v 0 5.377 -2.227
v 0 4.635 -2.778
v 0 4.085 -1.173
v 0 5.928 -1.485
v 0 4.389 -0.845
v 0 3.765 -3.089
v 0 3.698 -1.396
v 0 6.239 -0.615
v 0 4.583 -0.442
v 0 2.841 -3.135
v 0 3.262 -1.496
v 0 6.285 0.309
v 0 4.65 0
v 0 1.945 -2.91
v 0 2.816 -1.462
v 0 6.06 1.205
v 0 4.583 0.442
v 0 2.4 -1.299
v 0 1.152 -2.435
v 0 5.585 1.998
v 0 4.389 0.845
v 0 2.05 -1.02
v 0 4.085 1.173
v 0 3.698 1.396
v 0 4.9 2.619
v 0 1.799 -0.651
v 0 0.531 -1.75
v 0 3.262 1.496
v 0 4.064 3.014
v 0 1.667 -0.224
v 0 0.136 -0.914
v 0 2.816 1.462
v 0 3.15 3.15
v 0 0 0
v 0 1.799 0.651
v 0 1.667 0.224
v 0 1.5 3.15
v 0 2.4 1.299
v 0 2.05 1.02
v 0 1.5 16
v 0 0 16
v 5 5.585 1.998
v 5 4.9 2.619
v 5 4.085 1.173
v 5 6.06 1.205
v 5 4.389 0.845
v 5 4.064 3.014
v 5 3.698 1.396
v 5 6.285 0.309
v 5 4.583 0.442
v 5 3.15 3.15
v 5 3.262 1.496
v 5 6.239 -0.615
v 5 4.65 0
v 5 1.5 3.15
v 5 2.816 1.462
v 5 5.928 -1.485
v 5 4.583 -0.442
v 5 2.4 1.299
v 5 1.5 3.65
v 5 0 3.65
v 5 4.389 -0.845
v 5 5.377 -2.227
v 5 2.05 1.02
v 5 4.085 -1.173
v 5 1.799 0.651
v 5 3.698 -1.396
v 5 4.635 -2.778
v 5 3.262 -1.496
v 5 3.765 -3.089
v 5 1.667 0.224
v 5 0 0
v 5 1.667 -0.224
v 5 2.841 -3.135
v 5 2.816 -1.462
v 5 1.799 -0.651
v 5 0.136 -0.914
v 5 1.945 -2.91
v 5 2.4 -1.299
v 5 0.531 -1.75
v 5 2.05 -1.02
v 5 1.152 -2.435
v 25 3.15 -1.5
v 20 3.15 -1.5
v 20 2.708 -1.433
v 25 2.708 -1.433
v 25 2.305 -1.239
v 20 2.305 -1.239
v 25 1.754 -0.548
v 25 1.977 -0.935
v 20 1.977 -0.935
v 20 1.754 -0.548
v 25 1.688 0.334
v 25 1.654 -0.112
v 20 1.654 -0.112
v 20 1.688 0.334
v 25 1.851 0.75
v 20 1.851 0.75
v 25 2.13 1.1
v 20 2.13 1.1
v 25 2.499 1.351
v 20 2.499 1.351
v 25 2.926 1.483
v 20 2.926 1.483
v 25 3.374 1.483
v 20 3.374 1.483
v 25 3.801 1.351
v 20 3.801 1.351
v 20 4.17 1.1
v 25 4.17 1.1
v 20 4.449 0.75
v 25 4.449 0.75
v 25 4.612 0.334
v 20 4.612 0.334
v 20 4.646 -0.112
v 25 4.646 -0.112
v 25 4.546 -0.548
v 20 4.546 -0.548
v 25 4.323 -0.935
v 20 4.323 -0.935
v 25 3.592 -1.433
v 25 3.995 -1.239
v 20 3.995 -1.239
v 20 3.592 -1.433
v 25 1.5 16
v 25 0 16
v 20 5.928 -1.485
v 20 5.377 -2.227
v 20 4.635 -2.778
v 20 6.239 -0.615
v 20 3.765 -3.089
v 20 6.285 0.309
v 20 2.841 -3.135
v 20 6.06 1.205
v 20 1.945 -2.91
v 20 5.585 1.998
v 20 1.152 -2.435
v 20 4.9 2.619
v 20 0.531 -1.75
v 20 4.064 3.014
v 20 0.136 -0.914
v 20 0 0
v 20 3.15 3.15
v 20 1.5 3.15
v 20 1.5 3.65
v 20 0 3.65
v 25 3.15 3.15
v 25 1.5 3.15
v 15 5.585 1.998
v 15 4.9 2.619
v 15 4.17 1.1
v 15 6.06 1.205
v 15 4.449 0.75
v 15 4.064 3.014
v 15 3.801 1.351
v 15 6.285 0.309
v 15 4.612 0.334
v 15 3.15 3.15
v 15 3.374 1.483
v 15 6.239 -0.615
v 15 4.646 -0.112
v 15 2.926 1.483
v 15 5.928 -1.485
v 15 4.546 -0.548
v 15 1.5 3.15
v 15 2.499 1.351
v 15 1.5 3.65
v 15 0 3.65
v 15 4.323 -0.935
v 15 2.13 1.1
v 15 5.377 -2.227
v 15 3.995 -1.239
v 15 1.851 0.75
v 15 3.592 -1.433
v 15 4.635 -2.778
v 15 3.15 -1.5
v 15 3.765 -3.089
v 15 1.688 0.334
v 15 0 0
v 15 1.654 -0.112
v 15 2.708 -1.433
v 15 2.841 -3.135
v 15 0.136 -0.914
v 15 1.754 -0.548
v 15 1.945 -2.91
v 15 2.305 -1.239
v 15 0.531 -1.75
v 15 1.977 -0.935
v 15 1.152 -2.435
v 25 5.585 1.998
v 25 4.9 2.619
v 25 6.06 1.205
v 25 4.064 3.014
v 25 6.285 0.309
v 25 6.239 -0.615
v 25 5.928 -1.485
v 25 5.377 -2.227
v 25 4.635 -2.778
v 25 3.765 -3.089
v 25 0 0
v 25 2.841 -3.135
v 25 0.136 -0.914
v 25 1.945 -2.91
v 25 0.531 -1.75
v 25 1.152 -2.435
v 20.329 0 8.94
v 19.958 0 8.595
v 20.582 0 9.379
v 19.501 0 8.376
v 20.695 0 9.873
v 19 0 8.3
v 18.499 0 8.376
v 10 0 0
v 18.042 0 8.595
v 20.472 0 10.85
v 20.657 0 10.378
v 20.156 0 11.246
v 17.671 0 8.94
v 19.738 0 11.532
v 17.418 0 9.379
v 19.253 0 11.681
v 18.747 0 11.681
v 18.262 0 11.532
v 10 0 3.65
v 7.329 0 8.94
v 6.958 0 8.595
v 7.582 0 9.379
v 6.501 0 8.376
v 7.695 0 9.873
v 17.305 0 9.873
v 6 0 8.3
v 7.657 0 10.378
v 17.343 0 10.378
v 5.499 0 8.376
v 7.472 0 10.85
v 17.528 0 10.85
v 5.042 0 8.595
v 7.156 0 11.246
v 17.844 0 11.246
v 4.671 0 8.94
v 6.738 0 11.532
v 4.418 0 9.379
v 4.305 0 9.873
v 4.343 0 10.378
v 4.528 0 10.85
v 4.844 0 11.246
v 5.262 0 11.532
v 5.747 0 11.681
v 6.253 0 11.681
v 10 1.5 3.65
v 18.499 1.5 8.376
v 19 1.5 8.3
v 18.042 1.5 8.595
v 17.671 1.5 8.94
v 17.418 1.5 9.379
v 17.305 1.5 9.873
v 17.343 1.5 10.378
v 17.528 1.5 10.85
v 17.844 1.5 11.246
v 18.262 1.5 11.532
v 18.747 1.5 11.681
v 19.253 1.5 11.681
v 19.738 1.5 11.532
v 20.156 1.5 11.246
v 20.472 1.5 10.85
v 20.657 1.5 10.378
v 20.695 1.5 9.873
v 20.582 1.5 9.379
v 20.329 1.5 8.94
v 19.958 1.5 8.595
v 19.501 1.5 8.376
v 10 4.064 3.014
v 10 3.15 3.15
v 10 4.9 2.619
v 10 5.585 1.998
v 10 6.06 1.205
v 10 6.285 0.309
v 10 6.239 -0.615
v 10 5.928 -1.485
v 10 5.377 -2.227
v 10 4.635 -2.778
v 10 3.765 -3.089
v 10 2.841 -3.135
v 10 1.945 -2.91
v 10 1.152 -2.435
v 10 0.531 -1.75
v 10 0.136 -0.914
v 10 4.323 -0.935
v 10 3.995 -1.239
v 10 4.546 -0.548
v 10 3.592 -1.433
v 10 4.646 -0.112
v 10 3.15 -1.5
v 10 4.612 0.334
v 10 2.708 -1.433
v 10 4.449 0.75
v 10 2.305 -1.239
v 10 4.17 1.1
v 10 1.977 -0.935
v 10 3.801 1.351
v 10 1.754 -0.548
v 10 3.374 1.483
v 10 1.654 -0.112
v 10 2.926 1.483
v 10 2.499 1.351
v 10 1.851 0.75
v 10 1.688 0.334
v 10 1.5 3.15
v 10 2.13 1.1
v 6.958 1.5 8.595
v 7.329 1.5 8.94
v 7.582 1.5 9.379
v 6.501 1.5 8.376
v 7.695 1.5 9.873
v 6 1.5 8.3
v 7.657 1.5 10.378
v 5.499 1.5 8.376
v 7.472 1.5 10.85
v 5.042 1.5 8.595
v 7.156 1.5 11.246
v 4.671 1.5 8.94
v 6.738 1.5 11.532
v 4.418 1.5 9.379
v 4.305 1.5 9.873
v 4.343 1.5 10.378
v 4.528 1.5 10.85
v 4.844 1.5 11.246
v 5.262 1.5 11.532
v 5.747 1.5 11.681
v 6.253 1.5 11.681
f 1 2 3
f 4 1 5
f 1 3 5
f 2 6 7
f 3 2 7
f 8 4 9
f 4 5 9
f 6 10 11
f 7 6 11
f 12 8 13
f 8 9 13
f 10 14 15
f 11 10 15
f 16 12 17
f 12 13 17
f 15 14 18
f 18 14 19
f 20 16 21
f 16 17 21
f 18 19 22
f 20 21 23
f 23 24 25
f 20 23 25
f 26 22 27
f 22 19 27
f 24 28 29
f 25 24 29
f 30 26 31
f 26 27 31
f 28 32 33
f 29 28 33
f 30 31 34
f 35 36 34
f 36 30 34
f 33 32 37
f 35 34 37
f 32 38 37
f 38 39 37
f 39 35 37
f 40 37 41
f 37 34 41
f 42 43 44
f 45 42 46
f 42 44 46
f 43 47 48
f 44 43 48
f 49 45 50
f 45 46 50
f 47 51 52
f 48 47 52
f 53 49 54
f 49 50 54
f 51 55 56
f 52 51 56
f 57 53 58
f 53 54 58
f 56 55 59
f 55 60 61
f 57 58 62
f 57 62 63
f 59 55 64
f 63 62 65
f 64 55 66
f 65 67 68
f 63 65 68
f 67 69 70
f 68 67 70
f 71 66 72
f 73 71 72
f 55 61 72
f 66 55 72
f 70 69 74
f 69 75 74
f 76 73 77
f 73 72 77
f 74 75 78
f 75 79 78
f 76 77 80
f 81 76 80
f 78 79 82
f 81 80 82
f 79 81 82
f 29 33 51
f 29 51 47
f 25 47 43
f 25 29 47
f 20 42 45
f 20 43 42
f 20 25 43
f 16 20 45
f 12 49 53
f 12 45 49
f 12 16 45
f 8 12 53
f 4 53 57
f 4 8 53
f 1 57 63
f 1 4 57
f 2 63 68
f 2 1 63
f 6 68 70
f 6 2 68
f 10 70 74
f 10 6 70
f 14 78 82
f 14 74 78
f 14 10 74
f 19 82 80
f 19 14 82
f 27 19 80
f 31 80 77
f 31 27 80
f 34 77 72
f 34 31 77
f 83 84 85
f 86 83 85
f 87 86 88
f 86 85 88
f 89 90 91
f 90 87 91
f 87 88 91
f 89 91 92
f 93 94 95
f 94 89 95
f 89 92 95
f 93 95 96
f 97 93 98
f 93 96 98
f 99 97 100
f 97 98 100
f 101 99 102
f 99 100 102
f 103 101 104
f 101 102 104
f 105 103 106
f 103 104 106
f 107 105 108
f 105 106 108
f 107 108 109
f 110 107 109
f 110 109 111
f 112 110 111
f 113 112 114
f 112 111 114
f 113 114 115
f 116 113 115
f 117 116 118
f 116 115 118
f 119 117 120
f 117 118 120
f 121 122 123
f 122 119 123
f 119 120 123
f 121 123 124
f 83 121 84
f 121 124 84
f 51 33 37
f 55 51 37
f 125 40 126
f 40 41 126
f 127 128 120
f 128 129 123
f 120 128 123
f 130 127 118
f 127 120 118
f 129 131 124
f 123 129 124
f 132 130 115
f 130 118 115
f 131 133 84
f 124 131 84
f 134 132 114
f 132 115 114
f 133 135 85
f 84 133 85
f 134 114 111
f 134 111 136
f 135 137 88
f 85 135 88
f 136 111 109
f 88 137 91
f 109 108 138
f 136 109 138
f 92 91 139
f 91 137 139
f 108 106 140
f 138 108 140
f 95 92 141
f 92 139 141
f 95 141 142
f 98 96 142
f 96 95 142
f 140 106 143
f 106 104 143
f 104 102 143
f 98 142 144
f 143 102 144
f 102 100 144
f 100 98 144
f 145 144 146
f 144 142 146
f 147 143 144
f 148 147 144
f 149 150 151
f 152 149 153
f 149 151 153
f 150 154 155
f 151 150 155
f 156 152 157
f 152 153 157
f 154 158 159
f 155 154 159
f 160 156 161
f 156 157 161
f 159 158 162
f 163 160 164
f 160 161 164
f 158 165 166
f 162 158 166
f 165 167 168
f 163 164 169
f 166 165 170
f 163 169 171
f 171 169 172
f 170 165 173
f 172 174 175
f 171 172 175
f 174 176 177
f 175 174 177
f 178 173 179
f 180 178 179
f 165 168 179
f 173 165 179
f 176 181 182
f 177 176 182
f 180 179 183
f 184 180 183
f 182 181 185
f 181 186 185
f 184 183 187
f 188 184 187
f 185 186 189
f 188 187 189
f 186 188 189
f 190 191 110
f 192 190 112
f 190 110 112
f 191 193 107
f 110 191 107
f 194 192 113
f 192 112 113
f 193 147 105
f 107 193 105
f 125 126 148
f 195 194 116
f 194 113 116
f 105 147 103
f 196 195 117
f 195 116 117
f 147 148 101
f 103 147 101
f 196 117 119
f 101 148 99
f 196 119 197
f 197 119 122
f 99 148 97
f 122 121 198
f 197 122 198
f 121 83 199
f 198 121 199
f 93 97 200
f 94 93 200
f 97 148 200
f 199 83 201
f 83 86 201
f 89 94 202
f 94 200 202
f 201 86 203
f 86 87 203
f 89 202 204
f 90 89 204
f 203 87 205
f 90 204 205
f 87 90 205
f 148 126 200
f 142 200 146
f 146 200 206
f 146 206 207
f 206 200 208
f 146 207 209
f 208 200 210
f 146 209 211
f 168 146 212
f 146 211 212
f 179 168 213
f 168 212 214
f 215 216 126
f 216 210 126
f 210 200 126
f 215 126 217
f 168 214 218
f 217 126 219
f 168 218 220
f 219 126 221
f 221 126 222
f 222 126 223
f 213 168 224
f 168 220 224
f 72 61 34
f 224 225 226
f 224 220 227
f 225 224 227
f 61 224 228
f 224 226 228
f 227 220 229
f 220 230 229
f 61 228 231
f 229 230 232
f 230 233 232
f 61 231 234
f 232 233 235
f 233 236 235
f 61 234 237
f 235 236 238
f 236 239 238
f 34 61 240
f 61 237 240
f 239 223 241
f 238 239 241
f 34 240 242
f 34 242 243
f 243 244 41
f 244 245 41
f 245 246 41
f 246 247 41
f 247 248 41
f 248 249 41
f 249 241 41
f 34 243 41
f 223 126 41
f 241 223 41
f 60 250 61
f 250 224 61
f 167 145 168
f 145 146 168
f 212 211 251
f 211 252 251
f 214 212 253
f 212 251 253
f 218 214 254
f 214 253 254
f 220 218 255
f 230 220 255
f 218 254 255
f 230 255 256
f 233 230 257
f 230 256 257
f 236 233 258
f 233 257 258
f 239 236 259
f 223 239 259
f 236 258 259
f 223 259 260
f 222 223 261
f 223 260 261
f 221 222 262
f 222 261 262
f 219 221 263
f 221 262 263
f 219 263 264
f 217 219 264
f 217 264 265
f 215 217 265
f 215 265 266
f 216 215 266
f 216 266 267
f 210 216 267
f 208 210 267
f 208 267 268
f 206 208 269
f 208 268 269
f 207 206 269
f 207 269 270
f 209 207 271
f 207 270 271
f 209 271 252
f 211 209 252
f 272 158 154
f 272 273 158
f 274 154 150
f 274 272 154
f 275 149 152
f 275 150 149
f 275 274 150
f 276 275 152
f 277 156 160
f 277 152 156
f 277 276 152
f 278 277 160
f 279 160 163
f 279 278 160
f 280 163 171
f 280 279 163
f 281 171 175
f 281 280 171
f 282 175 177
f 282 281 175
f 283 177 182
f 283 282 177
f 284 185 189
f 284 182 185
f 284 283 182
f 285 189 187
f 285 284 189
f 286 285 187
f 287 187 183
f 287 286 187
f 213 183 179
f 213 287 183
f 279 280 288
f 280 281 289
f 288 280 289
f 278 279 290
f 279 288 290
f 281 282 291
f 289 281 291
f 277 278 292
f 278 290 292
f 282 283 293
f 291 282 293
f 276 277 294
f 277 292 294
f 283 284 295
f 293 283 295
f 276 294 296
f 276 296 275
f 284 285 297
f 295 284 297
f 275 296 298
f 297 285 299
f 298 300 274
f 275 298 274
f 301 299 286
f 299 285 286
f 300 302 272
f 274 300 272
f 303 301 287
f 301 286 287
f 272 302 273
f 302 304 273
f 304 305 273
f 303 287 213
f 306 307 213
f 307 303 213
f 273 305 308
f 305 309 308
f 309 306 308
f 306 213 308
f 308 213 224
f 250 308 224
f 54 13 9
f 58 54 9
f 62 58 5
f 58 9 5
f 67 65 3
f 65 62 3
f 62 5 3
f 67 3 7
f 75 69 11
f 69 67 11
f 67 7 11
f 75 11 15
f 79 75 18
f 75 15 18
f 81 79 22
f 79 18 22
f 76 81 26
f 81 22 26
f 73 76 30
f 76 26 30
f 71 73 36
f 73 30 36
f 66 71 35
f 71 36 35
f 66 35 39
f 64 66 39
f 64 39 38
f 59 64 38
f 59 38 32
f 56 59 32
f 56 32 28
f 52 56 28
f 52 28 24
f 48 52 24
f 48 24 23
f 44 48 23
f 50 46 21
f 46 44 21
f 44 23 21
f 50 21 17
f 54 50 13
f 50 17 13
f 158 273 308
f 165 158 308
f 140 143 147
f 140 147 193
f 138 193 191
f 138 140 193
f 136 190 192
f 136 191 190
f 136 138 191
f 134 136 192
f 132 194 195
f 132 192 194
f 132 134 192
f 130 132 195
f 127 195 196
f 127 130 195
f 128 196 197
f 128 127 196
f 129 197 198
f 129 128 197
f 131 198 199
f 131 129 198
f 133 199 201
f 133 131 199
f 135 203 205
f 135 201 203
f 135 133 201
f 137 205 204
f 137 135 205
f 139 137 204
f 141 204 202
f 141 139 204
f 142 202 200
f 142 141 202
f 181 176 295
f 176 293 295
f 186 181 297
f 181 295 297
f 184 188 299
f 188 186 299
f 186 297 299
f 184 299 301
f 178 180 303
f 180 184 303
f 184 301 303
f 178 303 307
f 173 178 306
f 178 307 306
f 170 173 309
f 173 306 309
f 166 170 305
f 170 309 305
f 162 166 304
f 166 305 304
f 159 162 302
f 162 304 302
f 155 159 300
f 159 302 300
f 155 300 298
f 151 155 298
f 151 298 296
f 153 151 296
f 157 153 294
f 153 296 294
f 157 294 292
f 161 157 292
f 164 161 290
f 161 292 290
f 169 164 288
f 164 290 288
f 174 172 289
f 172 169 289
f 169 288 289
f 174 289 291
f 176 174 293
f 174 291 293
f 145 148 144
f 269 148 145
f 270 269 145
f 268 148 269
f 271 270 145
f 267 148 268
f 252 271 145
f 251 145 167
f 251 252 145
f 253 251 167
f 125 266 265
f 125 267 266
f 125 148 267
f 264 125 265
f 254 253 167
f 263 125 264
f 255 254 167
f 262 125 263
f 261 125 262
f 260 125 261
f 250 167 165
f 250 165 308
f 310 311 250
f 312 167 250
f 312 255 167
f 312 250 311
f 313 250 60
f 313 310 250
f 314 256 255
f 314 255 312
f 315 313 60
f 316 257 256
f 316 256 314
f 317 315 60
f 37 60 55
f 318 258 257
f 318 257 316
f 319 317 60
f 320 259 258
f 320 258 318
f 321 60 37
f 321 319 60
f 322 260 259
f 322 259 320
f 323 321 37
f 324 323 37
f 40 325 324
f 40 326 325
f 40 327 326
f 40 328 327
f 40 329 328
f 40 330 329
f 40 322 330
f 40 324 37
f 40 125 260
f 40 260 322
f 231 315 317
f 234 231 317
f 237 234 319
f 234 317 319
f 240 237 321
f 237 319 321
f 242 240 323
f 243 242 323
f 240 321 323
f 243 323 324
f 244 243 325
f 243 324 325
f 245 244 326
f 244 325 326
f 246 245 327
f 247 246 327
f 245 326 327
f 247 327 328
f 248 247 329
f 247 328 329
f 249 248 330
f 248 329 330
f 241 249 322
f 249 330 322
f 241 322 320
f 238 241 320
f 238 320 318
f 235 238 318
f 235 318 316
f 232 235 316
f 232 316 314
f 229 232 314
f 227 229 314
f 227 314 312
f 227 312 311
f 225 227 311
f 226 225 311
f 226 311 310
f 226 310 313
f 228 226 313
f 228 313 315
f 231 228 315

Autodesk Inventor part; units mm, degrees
sketch "Sketch_1" plane through (0, 0, 0) normal (0, 1, 0) x (-1, 0, 0)
  line L0 (0, 16) -> (-25, 16)
  line L1 (-25, 16) -> (-25, 3.15)
  line L2 (-25, 3.15) -> (-20, 3.15)
  line L3 (-20, 3.15) -> (-20, 3.65)
  line L4 (-20, 3.65) -> (-15, 3.65)
  line L5 (-15, 3.65) -> (-15, 3.15)
  line L6 (-15, 3.15) -> (-10, 3.15)
  line L7 (-10, 3.15) -> (-10, 3.65)
  line L8 (-10, 3.65) -> (-5, 3.65)
  line L9 (-5, 3.65) -> (-5, 3.15)
  line L10 (-5, 3.15) -> (0, 3.15)
  line L11 (0, 3.15) -> (0, 16)
extrude "Extrusion1" add sketch "Sketch_1" along normal blind 1.5
sketch "Sketch_2" plane through (0, 0, 0) normal (1, 0, 0) x (0, 1, 0)
  line L0 (1.5, 10.6667) -> (0, 10.6667)
  line L1 (0, 10.6667) -> (0, 0)
  arc A0 (0, 0) -> (3.15, 3.15) centre (3.15, 0) ccw
  line L2 (3.15, 3.15) -> (1.5, 3.15)
  line L3 (1.5, 3.15) -> (1.5, 10.6667)
  circle A1 centre (3.15, 0) radius 1.5
extrude "Extrusion2" add sketch "Sketch_2" along normal blind 5
sketch "Sketch_3" plane through (10, 0, 0) normal (1, 0, 0) x (0, 0, -1)
  line L0 (-10.6667, 1.5) -> (-10.6667, 0)
  line L1 (-10.6667, 0) -> (0, 0)
  arc A0 (0, 0) -> (-3.15, 3.15) centre (0, 3.15) ccw
  line L2 (-3.15, 3.15) -> (-3.15, 1.5)
  line L3 (-3.15, 1.5) -> (-10.6667, 1.5)
  circle A1 centre (0, 3.15) radius 1.5
extrude "Extrusion3" add sketch "Sketch_3" along normal blind 5
sketch "Sketch_4" plane through (20, 0, 0) normal (1, 0, 0) x (0, 0, -1)
  line L0 (-10.6667, 1.5) -> (-10.6667, 0)
  line L1 (-10.6667, 0) -> (0, 0)
  arc A0 (0, 0) -> (-3.15, 3.15) centre (0, 3.15) ccw
  line L2 (-3.15, 3.15) -> (-3.15, 1.5)
  line L3 (-3.15, 1.5) -> (-10.6667, 1.5)
  circle A1 centre (0, 3.15) radius 1.5
extrude "Extrusion4" add sketch "Sketch_4" along normal blind 5
sketch "Sketch5" plane through (0, 0, 0) normal (0, -1, 0) x (1, 0, 0)
  point P0 (6, 10)
hole "Hole1" at (6, 0, 10) direction (0, 1, 0) diameter 3.4 depth 2
sketch "Sketch6" plane through (0, 0, 0) normal (0, -1, 0) x (1, 0, 0)
  point P0 (19, 10)
hole "Hole2" at (19, 0, 10) direction (0, 1, 0) diameter 3.4 depth 2
ref_plane "2_XY" through (0, 3.15, 0) normal (1, 0, 0) x (0, 0, -1)
ref_plane "2_YZ" through (0, 3.15, 0) normal (0, 0, -1) x (0, 1, 0)
ref_plane "2_ZX" through (0, 3.15, 0) normal (0, 1, 0) x (1, 0, 0)
properties part number "2HHKS25" material "ステンレス鋼"
